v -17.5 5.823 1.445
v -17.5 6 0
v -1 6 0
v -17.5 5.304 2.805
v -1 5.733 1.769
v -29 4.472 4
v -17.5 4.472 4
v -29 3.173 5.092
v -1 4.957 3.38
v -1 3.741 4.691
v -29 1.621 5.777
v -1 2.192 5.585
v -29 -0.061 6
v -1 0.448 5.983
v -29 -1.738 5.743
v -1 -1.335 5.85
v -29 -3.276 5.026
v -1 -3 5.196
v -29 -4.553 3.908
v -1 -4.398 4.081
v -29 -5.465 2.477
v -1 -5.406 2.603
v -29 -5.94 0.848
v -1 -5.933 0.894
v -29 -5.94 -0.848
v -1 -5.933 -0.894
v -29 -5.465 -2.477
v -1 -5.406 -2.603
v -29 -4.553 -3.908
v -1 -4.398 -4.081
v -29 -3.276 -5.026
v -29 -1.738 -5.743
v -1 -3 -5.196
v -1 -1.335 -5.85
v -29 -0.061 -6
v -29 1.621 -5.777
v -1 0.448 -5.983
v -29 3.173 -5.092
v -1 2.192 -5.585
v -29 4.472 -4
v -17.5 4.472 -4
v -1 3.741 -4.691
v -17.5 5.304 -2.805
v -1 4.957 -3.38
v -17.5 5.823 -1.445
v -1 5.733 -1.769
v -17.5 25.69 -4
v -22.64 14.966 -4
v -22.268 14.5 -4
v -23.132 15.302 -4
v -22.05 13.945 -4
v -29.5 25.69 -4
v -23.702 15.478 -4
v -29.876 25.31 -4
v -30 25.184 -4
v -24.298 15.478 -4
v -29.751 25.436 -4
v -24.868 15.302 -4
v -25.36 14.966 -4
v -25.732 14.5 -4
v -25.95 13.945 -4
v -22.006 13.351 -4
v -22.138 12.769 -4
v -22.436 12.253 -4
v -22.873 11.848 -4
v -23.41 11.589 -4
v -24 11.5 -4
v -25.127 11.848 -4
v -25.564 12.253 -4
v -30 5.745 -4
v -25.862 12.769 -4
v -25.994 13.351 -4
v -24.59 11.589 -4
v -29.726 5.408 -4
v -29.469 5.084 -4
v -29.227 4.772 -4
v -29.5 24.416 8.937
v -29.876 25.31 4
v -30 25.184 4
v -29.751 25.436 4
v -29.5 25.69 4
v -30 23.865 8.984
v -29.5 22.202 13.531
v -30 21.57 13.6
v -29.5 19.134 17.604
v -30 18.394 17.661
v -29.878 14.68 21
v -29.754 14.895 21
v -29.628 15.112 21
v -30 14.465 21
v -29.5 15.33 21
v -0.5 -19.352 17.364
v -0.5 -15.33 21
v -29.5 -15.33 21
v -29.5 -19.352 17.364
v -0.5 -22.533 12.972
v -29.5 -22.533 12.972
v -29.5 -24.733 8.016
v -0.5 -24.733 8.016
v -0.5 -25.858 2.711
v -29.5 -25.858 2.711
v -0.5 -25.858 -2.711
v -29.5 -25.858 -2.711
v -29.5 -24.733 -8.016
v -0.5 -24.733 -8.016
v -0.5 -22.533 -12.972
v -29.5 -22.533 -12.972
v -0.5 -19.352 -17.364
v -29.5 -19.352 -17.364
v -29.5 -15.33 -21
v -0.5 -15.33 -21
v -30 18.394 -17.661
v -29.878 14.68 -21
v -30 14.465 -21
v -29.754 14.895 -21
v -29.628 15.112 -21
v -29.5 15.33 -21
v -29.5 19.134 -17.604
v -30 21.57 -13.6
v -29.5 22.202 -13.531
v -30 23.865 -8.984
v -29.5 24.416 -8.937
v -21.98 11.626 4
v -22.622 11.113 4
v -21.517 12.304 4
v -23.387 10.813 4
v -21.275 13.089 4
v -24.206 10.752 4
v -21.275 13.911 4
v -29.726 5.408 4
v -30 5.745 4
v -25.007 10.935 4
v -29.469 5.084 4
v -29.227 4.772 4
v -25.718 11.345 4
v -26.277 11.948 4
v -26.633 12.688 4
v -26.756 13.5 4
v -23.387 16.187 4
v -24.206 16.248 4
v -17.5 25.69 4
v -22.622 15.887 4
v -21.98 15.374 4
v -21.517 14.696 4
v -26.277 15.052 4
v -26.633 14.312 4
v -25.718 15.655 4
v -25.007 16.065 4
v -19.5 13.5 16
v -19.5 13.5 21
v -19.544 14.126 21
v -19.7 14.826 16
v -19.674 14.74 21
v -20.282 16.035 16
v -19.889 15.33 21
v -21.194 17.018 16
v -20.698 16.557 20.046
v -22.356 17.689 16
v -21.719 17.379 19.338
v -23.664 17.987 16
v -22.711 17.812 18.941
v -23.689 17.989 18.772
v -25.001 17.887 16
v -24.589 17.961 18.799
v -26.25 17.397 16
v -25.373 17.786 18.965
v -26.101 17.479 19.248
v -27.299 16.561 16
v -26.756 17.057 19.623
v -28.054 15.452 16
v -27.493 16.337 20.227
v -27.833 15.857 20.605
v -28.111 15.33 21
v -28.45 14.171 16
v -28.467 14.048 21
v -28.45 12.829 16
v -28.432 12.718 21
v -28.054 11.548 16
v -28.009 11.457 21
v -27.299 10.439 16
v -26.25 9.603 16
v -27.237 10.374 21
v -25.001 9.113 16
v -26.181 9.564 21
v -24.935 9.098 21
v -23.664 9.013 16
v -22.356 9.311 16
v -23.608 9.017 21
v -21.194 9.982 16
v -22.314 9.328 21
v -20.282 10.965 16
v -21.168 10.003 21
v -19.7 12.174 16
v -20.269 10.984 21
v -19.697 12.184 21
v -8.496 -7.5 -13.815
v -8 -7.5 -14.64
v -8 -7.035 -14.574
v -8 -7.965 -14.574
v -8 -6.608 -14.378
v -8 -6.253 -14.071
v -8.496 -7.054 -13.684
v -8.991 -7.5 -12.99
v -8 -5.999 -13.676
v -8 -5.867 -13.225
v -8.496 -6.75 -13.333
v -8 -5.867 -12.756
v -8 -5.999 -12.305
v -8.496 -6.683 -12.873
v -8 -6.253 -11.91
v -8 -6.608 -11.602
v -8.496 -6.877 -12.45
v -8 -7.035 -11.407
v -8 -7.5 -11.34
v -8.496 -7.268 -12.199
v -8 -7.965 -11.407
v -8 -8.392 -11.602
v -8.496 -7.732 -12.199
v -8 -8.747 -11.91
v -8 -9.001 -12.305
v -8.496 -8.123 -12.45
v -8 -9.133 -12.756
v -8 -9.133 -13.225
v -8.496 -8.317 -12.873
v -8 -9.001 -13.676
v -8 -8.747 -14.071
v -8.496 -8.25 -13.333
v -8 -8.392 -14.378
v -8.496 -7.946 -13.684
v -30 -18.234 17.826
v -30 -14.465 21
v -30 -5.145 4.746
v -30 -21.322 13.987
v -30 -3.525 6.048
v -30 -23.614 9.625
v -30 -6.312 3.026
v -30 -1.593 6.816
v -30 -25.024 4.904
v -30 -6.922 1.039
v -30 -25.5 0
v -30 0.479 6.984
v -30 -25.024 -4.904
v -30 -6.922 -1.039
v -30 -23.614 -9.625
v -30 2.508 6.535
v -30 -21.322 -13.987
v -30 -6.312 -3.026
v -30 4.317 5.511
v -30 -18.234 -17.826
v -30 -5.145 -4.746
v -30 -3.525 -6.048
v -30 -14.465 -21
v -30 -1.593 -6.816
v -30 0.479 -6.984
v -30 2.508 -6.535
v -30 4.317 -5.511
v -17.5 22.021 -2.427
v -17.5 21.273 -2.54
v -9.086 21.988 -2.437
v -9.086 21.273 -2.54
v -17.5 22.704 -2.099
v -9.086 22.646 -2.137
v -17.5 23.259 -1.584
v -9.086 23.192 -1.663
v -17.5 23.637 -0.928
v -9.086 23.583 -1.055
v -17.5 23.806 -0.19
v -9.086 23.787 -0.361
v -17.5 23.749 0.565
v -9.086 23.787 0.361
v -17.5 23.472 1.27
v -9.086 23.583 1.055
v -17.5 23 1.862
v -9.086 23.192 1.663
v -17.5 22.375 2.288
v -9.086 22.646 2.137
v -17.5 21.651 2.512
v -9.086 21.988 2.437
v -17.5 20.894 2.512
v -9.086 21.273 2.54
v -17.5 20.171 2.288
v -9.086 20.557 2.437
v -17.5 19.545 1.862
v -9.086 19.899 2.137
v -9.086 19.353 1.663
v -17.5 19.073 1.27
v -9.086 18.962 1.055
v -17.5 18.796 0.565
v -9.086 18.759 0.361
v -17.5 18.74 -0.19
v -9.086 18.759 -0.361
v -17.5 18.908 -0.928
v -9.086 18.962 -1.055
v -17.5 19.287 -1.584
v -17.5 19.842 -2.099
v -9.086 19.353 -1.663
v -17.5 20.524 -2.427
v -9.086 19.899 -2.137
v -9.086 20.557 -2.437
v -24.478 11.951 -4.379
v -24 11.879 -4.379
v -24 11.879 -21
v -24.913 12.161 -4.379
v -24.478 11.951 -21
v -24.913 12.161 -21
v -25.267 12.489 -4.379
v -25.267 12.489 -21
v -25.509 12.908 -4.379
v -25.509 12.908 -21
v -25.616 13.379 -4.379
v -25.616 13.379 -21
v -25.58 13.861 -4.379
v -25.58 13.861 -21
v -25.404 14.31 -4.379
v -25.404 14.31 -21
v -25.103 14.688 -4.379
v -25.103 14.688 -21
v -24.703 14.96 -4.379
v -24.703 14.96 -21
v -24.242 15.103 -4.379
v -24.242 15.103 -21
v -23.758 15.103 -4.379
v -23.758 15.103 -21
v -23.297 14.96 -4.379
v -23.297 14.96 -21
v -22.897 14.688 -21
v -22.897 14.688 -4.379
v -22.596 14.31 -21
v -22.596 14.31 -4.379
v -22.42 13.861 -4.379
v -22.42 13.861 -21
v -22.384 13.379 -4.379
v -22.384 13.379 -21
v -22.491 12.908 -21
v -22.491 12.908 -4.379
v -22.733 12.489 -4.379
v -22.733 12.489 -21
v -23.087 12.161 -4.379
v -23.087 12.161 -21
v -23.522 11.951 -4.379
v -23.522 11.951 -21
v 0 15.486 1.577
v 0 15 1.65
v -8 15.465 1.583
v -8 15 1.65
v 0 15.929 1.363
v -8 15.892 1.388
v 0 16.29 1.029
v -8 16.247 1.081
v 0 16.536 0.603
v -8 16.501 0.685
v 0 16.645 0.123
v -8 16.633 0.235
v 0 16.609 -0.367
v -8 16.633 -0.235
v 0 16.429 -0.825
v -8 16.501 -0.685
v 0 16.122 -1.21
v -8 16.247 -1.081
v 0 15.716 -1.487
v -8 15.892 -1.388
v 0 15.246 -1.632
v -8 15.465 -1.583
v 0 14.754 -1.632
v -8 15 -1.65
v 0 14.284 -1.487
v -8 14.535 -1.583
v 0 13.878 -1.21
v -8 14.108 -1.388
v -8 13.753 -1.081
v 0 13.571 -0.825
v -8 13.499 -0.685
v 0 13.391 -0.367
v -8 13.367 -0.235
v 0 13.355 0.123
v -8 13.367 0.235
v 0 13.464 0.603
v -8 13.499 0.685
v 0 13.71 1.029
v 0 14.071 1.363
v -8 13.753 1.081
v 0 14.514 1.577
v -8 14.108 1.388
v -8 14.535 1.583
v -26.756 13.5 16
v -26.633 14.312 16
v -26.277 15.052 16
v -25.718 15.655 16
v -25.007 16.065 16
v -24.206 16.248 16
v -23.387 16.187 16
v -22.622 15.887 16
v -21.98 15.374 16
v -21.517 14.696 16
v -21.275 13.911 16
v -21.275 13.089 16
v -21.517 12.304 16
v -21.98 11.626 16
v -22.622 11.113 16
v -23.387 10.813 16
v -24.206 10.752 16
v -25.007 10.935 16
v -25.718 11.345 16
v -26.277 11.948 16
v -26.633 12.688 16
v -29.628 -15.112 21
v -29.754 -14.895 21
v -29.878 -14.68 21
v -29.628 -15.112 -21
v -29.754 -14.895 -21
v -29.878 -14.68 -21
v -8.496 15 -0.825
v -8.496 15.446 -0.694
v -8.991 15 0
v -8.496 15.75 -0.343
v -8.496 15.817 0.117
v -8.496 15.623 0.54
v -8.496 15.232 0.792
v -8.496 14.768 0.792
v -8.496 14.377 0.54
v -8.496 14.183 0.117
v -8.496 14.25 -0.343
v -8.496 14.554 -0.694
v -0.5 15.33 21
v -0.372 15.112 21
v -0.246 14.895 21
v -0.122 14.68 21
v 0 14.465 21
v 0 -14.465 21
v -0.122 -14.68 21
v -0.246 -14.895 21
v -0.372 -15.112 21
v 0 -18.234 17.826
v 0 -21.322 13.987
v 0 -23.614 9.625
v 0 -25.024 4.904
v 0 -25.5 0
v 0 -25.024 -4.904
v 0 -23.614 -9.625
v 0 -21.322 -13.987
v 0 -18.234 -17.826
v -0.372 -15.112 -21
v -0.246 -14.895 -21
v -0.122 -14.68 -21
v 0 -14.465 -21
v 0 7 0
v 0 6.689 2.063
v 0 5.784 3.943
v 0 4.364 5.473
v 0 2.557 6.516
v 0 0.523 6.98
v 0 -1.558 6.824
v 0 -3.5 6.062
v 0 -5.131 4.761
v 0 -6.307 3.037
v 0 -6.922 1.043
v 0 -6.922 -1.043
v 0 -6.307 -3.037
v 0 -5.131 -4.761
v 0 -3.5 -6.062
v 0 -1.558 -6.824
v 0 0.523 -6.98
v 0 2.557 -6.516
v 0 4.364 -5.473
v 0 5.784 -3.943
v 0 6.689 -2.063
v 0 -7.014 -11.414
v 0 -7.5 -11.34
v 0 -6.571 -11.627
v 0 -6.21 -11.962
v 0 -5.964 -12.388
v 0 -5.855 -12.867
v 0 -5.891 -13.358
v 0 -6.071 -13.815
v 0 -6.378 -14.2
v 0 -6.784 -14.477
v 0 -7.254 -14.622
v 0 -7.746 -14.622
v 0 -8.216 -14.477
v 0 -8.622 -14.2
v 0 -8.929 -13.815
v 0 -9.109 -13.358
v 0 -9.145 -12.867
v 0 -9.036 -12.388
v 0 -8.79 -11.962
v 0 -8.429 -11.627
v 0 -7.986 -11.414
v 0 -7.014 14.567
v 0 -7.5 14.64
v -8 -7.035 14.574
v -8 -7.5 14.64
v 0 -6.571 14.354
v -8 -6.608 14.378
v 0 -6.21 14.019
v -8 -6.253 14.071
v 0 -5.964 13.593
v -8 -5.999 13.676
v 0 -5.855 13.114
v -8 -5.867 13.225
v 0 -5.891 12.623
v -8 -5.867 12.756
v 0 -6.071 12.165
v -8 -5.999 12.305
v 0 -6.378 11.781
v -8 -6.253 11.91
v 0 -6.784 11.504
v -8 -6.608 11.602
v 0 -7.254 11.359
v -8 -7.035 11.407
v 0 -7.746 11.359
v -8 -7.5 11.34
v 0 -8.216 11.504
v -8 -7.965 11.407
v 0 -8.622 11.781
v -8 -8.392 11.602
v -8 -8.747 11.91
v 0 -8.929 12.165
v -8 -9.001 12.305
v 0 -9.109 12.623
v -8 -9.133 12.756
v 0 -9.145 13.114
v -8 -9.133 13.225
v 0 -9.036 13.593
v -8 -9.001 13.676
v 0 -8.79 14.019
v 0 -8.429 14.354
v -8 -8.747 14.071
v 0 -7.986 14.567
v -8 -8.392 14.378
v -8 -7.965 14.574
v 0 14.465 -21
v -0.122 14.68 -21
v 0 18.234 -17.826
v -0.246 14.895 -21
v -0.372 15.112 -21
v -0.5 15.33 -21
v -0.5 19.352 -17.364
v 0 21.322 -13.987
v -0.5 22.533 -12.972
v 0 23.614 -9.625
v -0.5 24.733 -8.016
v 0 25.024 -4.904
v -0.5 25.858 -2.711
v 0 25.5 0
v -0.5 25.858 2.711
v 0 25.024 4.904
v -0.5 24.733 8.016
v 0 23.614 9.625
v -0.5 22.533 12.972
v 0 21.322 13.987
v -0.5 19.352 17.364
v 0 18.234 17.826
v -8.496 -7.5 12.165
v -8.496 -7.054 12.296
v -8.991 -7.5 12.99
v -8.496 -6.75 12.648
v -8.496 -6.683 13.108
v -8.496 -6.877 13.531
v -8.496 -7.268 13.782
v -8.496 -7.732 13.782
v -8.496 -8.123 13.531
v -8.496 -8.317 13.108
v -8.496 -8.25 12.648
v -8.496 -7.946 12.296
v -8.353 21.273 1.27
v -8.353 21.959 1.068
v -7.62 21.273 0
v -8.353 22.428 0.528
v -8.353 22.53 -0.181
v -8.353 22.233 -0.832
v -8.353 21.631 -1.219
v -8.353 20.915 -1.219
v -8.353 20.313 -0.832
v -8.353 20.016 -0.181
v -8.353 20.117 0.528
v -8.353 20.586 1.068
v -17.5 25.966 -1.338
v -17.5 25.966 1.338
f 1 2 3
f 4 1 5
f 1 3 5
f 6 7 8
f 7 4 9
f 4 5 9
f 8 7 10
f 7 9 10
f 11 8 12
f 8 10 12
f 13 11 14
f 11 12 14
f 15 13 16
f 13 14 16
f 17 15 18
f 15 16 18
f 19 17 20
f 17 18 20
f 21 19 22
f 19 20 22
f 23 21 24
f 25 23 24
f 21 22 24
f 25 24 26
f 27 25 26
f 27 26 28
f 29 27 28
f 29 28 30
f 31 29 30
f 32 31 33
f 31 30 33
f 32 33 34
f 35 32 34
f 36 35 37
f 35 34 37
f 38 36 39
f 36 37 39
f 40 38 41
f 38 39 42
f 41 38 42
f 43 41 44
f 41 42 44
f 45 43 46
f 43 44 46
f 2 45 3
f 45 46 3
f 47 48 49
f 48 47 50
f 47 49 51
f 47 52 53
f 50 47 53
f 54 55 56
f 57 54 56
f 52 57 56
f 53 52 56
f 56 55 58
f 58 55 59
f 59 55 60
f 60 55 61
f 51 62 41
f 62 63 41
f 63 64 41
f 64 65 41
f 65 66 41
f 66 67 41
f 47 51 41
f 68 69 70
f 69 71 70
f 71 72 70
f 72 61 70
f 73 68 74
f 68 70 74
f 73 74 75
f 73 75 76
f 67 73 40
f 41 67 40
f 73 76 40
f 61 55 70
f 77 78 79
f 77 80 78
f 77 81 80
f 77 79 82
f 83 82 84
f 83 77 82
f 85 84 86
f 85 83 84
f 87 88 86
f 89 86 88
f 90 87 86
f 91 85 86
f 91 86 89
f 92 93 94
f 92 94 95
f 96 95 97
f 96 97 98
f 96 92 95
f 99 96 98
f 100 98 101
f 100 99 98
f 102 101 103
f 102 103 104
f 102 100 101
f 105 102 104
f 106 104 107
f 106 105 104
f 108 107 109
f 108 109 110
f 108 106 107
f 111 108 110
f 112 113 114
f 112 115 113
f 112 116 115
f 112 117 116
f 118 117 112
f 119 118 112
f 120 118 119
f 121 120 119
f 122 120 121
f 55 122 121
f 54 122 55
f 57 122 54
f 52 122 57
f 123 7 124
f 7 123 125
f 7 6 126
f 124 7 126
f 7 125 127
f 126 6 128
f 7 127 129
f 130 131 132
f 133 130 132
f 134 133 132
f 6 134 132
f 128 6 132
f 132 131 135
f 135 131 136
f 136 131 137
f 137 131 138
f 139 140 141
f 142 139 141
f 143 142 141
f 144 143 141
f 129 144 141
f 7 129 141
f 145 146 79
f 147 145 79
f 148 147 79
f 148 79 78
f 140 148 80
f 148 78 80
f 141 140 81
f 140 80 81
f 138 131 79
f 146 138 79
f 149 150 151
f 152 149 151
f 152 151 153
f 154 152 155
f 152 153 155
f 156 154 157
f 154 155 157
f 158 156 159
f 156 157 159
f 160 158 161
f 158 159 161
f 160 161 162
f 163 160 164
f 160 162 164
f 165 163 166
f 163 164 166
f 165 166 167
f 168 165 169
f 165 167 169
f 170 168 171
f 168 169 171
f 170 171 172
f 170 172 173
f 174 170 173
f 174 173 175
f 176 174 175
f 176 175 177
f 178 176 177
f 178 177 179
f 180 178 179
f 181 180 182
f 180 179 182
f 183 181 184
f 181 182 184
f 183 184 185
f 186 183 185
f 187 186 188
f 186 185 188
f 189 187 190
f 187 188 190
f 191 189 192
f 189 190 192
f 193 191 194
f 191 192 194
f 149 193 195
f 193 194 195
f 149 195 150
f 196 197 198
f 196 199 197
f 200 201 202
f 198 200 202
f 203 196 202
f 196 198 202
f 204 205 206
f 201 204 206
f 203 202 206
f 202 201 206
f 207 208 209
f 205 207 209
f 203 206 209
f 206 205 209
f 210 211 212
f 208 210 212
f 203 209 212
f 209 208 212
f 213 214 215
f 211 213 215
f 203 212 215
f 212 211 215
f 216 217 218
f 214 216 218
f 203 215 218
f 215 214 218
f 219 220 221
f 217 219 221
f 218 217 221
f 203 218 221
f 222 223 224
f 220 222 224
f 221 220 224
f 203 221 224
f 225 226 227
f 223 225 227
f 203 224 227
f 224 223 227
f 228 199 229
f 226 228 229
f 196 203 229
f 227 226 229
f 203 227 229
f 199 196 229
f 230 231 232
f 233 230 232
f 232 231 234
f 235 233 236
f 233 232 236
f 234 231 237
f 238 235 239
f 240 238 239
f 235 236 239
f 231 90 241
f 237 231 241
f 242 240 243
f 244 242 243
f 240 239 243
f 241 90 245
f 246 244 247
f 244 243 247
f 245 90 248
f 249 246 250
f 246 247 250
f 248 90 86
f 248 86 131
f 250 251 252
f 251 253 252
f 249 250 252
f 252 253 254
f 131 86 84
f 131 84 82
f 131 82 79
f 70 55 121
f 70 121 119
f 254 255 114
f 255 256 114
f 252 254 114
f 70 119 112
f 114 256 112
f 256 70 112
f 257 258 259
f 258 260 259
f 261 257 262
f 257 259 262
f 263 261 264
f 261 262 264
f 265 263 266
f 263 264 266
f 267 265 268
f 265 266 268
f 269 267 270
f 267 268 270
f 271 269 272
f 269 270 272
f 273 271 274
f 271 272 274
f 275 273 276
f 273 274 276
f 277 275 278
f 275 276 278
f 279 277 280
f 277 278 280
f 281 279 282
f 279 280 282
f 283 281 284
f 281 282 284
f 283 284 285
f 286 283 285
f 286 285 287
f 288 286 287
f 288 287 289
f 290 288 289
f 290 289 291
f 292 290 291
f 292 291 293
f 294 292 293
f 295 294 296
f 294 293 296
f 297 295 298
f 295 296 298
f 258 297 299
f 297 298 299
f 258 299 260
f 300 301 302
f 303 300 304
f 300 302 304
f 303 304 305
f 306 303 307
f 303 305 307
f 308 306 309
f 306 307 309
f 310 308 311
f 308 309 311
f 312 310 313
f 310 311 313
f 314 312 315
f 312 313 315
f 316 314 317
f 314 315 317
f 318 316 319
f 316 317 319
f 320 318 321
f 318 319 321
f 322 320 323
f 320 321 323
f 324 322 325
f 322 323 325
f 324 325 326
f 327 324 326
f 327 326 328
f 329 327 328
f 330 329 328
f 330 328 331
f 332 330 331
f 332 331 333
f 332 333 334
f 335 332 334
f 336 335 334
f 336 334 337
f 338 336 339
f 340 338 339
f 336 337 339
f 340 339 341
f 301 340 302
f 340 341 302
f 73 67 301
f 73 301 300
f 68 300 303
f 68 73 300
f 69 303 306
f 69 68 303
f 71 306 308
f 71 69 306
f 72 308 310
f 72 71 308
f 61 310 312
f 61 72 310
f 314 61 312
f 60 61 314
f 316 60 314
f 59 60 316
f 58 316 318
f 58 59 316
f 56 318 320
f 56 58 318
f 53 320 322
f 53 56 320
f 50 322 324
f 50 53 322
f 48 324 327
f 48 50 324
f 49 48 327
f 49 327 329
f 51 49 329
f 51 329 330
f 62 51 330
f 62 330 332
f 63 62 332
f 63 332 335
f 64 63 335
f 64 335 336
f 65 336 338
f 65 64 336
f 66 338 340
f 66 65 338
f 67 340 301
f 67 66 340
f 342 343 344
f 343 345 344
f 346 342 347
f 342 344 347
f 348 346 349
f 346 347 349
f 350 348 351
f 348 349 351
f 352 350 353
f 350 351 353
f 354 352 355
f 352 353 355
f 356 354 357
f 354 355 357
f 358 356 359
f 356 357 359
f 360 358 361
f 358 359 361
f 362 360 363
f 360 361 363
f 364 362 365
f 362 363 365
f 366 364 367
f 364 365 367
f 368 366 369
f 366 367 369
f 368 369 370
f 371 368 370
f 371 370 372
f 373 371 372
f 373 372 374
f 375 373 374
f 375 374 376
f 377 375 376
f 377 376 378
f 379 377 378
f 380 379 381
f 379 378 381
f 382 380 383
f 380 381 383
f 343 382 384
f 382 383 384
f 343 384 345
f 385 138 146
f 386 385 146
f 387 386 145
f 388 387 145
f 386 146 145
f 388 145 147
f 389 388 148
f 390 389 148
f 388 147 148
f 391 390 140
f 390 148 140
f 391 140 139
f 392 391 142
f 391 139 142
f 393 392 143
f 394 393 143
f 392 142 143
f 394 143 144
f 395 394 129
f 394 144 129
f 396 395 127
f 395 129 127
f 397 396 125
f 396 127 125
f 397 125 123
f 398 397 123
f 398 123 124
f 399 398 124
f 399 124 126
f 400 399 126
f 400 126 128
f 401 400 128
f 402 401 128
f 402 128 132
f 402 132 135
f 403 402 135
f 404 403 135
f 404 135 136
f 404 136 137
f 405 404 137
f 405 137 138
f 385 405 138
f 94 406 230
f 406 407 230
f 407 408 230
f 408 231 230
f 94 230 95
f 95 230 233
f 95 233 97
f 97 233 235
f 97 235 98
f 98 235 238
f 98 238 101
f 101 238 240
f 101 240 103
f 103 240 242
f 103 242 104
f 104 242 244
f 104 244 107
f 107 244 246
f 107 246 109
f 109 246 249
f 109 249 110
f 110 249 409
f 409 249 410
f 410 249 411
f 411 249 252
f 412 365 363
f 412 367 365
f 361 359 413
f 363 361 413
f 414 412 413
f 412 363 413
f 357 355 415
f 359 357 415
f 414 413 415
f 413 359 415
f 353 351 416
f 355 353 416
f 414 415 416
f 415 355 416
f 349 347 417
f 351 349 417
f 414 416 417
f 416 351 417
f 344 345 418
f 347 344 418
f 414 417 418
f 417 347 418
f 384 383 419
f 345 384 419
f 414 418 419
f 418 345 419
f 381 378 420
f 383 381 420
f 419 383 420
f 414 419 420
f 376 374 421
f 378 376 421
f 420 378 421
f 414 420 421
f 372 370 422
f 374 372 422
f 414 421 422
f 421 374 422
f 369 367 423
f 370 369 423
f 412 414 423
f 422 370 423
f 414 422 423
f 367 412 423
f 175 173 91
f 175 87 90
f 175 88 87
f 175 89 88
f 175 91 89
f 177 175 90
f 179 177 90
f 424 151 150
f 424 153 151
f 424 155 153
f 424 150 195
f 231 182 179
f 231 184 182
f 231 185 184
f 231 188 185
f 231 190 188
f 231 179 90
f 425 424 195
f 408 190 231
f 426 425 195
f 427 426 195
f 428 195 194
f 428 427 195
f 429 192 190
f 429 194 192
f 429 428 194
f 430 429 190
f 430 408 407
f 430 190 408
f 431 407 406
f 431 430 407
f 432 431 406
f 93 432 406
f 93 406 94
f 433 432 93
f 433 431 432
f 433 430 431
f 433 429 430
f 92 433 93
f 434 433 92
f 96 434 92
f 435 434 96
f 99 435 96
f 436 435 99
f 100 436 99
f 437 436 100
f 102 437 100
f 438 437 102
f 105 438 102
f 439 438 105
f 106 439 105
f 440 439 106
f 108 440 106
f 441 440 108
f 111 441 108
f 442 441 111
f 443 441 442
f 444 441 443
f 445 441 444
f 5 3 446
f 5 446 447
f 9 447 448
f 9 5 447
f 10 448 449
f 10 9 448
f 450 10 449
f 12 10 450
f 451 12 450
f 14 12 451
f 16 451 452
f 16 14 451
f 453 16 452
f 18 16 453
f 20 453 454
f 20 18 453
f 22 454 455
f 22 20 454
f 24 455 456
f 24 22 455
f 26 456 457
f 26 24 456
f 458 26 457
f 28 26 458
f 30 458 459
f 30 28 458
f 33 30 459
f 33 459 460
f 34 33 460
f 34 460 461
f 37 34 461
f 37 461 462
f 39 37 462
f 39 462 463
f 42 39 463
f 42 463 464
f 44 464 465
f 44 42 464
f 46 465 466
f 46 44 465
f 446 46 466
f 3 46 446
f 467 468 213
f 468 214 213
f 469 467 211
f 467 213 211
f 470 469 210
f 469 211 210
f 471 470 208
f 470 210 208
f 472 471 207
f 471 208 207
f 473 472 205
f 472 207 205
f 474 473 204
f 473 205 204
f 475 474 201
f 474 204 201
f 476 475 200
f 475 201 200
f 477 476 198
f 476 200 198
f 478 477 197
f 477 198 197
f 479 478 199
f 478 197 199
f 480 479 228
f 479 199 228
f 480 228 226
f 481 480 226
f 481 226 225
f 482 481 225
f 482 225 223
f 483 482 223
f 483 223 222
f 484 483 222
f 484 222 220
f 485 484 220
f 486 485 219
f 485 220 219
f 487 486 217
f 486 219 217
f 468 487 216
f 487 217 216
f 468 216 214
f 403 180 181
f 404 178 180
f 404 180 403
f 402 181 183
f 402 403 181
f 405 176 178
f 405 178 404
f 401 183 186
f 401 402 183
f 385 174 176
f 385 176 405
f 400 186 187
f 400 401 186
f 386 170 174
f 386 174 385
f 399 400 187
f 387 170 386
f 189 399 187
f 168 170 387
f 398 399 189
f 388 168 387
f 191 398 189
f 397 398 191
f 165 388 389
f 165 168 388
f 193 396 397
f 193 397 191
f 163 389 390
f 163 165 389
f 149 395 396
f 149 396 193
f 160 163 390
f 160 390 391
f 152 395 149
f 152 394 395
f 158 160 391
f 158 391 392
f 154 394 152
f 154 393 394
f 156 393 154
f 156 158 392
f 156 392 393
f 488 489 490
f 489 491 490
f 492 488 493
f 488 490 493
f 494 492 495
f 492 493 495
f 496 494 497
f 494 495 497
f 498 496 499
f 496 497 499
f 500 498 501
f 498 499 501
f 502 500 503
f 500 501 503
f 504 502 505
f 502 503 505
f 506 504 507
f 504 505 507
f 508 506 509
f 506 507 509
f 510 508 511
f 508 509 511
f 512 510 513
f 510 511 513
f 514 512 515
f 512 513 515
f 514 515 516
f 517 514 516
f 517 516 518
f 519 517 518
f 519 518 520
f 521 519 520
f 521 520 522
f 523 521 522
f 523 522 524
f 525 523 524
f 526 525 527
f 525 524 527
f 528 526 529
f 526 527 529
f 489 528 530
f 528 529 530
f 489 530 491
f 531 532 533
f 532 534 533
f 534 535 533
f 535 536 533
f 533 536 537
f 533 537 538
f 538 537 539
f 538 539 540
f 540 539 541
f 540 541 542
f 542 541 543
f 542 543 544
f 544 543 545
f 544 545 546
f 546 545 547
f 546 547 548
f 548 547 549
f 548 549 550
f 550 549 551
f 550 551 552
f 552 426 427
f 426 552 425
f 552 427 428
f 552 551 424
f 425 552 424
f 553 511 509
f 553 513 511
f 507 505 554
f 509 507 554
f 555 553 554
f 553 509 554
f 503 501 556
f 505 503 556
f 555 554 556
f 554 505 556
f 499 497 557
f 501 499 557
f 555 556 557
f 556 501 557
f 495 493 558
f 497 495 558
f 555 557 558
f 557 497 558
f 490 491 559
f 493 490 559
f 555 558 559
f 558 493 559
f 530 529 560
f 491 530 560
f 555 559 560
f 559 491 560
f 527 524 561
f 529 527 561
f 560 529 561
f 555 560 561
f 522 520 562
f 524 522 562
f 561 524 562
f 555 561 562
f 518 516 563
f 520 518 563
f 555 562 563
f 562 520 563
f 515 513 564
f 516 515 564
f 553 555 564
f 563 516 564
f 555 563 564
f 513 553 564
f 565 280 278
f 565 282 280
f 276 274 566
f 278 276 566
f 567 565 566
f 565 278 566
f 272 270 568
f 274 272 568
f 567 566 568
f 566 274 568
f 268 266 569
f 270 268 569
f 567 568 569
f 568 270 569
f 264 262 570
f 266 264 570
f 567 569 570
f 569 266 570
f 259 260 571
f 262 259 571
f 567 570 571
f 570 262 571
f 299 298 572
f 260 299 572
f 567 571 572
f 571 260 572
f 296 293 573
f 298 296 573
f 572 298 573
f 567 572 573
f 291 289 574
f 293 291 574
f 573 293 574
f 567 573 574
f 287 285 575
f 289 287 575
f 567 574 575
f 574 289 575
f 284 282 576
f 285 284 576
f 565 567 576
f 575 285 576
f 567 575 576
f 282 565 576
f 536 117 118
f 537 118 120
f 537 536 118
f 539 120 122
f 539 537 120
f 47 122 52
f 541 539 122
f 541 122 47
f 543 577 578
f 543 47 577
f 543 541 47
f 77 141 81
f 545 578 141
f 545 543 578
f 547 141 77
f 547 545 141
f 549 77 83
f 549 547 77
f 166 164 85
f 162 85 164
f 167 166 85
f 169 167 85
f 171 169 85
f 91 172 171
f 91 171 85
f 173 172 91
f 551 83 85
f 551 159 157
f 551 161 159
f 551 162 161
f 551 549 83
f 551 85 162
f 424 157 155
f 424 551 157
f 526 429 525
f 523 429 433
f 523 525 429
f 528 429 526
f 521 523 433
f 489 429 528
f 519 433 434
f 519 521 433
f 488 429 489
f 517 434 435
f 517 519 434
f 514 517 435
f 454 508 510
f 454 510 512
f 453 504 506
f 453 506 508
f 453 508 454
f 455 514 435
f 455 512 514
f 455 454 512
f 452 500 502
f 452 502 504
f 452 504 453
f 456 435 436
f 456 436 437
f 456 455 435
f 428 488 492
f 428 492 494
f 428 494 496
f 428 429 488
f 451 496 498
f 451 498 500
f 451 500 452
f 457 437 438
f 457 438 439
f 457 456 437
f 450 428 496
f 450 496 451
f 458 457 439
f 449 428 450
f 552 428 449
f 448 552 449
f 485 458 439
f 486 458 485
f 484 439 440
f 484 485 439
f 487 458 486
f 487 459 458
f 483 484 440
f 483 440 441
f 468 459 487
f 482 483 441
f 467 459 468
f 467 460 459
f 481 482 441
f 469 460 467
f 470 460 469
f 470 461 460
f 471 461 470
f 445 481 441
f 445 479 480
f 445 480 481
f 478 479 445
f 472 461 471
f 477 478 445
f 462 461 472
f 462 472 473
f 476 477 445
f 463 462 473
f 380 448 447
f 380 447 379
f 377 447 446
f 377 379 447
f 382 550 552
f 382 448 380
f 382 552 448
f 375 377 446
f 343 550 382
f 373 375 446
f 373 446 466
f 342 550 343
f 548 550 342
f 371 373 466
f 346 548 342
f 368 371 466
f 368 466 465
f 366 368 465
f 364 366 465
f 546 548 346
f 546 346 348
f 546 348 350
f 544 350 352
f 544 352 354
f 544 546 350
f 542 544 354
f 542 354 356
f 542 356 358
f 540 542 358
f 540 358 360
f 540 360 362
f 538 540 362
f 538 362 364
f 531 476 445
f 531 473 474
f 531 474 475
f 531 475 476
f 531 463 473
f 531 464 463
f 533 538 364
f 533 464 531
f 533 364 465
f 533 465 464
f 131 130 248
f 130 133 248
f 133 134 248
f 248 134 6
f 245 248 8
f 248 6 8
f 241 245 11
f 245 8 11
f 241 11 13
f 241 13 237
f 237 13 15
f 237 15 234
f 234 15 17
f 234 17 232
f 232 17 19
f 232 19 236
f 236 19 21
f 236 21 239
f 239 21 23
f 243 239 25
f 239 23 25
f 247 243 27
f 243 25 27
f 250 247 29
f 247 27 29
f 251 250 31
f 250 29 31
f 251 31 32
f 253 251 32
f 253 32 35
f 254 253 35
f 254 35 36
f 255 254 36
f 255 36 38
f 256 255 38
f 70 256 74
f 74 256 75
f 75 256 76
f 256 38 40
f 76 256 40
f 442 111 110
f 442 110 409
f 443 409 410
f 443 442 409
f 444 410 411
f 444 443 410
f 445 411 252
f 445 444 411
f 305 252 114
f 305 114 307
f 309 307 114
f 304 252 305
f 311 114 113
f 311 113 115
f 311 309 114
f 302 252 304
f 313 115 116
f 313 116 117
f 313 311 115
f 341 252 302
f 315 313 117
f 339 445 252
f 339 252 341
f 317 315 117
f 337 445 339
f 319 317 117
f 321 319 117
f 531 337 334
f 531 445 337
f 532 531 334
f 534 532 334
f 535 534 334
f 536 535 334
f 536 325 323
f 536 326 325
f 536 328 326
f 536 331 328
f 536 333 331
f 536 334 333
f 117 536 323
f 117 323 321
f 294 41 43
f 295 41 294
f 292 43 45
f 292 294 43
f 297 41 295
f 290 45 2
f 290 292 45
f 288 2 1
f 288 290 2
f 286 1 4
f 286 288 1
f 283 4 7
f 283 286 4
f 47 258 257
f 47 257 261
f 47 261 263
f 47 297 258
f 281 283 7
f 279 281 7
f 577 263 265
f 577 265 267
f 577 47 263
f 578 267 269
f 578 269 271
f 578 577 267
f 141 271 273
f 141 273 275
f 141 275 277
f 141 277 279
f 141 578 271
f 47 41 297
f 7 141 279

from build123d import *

# Parameters (mm, degrees)
BOSS_EXTRUDE1_DEPTH                     = 30
CUT_EXTRUDE1_DEPTH                      = 12.5
SKETCH3_W                               = 30
SKETCH3_H                               = 6
HOLE1_D                                 = 5.08
HOLE1_DEPTH                             = 8.413530316
HOLE1_TIP                               = 1.466469684
SKETCH6_W                               = 1.621
SKETCH6_H                               = 17
CBORE_FOR_M5_HEX_HEAD_BOLT1_D           = 5.5118
CBORE_FOR_M5_HEX_HEAD_BOLT1_DEPTH       = 17
CBORE_FOR_M5_HEX_HEAD_BOLT1_CBORE_D     = 9
CBORE_FOR_M5_HEX_HEAD_BOLT1_CBORE_DEPTH = 5
CHAMFER1_SIZE                           = 0.5
CHAMFER2_SIZE                           = 1
CHAMFER3_SIZE                           = 0.379
M4_TAPPED_HOLE1_D                       = 3.3
M4_TAPPED_HOLE1_DEPTH                   = 8
M4_TAPPED_HOLE1_TIP                     = 0.991420021


with BuildPart() as part:
    # Sketch1 → Boss-Extrude1 (new body)
    with BuildSketch(Plane(origin=(0, 0, 0), x_dir=(0, 0, -1), z_dir=(1, 0, 0))):
        with BuildLine():
            Line((21, -15.329709717), (21, 15.329709717))
            ThreePointArc((21, 15.329709717), (0, 26), (-21, 15.329709717))
            Line((-21, 15.329709717), (-21, -15.329709717))
            ThreePointArc((-21, -15.329709717), (0, -26), (21, -15.329709717))
        make_face()
    extrude(amount=-BOSS_EXTRUDE1_DEPTH)

    # Sketch2 → Cut-Extrude1 (cut)
    with BuildSketch(Plane.ZY.offset(30)):
        with BuildLine():
            Line((-4, 25.690465157), (-4, 4.472135955))
            ThreePointArc((-4, 4.472135955), (0, 6), (4, 4.472135955))
            Line((4, 4.472135955), (4, 25.690465157))
            ThreePointArc((4, 25.690465157), (0, 26), (-4, 25.690465157))
        make_face()
    extrude(amount=-CUT_EXTRUDE1_DEPTH, mode=Mode.SUBTRACT)

    # Sketch3 → Cut-Revolve1 (revolve, cut)
    with BuildSketch(Plane.XY):
        with Locations((-15, 3)):
            Rectangle(SKETCH3_W, SKETCH3_H)
    revolve(axis=Axis((-30, 0, 0), (1, 0, 0)), mode=Mode.SUBTRACT)

    # Hole1
    with Locations(Plane.ZY.offset(17.5)):
        with Locations((0, 21.27272472)):
            Hole(HOLE1_D / 2, depth=HOLE1_DEPTH)
            with Locations((0, 0, -(HOLE1_DEPTH + HOLE1_TIP / 2))):  # 120° drill point
                Cone(0, HOLE1_D / 2, HOLE1_TIP, mode=Mode.SUBTRACT)

    # Sketch6 → M3 Clearance Hole1 (revolve, cut)
    with BuildSketch(Plane(origin=(-24, 13.5, -4), x_dir=(0, -1, 0), z_dir=(1, 0, 0))):
        with Locations((0.8105, 8.5)):
            Rectangle(SKETCH6_W, SKETCH6_H)
    revolve(axis=Axis((-24, 13.5, 2.35), (0, 0, -1)), mode=Mode.SUBTRACT)

    # CBORE for M5 Hex Head Bolt1
    with Locations(Plane.XY.offset(21)):
        with Locations((-24, 13.5)):
            CounterBoreHole(CBORE_FOR_M5_HEX_HEAD_BOLT1_D / 2, CBORE_FOR_M5_HEX_HEAD_BOLT1_CBORE_D / 2, CBORE_FOR_M5_HEX_HEAD_BOLT1_CBORE_DEPTH, depth=CBORE_FOR_M5_HEX_HEAD_BOLT1_DEPTH)

    # Chamfer1
    chamfer1_edges = [part.edges().sort_by_distance(p)[0] for p in [
        (-30, 22.201659548, -13.530939115),
        (-30, 22.201659548, 13.530939115),
        (-30, -26, 0),
        (0, 26, 0),
        (0, -26, 0),
    ]]
    chamfer(chamfer1_edges, length=CHAMFER1_SIZE)

    # Chamfer2
    chamfer2_edges = [part.edges().sort_by_distance(p)[0] for p in [
        (-30, -6, 0),
        (0, -6, 0),
    ]]
    chamfer(chamfer2_edges, length=CHAMFER2_SIZE)

    # Chamfer3
    chamfer3_edges = [part.edges().sort_by_distance(p)[0] for p in [
        (-24, 15.121, -4),
    ]]
    chamfer(chamfer3_edges, length=CHAMFER3_SIZE)

    # M4 Tapped Hole1
    with Locations(Plane(origin=(0, 0, 0), x_dir=(0, 0, -1), z_dir=(1, 0, 0))):
        with Locations((0, 15), (12.990381057, -7.5), (-12.990381057, -7.5), (0, 0)):
            Hole(M4_TAPPED_HOLE1_D / 2, depth=M4_TAPPED_HOLE1_DEPTH)
            with Locations((0, 0, -(M4_TAPPED_HOLE1_DEPTH + M4_TAPPED_HOLE1_TIP / 2))):  # 118° drill point
                Cone(0, M4_TAPPED_HOLE1_D / 2, M4_TAPPED_HOLE1_TIP, mode=Mode.SUBTRACT)


solid = part.part
